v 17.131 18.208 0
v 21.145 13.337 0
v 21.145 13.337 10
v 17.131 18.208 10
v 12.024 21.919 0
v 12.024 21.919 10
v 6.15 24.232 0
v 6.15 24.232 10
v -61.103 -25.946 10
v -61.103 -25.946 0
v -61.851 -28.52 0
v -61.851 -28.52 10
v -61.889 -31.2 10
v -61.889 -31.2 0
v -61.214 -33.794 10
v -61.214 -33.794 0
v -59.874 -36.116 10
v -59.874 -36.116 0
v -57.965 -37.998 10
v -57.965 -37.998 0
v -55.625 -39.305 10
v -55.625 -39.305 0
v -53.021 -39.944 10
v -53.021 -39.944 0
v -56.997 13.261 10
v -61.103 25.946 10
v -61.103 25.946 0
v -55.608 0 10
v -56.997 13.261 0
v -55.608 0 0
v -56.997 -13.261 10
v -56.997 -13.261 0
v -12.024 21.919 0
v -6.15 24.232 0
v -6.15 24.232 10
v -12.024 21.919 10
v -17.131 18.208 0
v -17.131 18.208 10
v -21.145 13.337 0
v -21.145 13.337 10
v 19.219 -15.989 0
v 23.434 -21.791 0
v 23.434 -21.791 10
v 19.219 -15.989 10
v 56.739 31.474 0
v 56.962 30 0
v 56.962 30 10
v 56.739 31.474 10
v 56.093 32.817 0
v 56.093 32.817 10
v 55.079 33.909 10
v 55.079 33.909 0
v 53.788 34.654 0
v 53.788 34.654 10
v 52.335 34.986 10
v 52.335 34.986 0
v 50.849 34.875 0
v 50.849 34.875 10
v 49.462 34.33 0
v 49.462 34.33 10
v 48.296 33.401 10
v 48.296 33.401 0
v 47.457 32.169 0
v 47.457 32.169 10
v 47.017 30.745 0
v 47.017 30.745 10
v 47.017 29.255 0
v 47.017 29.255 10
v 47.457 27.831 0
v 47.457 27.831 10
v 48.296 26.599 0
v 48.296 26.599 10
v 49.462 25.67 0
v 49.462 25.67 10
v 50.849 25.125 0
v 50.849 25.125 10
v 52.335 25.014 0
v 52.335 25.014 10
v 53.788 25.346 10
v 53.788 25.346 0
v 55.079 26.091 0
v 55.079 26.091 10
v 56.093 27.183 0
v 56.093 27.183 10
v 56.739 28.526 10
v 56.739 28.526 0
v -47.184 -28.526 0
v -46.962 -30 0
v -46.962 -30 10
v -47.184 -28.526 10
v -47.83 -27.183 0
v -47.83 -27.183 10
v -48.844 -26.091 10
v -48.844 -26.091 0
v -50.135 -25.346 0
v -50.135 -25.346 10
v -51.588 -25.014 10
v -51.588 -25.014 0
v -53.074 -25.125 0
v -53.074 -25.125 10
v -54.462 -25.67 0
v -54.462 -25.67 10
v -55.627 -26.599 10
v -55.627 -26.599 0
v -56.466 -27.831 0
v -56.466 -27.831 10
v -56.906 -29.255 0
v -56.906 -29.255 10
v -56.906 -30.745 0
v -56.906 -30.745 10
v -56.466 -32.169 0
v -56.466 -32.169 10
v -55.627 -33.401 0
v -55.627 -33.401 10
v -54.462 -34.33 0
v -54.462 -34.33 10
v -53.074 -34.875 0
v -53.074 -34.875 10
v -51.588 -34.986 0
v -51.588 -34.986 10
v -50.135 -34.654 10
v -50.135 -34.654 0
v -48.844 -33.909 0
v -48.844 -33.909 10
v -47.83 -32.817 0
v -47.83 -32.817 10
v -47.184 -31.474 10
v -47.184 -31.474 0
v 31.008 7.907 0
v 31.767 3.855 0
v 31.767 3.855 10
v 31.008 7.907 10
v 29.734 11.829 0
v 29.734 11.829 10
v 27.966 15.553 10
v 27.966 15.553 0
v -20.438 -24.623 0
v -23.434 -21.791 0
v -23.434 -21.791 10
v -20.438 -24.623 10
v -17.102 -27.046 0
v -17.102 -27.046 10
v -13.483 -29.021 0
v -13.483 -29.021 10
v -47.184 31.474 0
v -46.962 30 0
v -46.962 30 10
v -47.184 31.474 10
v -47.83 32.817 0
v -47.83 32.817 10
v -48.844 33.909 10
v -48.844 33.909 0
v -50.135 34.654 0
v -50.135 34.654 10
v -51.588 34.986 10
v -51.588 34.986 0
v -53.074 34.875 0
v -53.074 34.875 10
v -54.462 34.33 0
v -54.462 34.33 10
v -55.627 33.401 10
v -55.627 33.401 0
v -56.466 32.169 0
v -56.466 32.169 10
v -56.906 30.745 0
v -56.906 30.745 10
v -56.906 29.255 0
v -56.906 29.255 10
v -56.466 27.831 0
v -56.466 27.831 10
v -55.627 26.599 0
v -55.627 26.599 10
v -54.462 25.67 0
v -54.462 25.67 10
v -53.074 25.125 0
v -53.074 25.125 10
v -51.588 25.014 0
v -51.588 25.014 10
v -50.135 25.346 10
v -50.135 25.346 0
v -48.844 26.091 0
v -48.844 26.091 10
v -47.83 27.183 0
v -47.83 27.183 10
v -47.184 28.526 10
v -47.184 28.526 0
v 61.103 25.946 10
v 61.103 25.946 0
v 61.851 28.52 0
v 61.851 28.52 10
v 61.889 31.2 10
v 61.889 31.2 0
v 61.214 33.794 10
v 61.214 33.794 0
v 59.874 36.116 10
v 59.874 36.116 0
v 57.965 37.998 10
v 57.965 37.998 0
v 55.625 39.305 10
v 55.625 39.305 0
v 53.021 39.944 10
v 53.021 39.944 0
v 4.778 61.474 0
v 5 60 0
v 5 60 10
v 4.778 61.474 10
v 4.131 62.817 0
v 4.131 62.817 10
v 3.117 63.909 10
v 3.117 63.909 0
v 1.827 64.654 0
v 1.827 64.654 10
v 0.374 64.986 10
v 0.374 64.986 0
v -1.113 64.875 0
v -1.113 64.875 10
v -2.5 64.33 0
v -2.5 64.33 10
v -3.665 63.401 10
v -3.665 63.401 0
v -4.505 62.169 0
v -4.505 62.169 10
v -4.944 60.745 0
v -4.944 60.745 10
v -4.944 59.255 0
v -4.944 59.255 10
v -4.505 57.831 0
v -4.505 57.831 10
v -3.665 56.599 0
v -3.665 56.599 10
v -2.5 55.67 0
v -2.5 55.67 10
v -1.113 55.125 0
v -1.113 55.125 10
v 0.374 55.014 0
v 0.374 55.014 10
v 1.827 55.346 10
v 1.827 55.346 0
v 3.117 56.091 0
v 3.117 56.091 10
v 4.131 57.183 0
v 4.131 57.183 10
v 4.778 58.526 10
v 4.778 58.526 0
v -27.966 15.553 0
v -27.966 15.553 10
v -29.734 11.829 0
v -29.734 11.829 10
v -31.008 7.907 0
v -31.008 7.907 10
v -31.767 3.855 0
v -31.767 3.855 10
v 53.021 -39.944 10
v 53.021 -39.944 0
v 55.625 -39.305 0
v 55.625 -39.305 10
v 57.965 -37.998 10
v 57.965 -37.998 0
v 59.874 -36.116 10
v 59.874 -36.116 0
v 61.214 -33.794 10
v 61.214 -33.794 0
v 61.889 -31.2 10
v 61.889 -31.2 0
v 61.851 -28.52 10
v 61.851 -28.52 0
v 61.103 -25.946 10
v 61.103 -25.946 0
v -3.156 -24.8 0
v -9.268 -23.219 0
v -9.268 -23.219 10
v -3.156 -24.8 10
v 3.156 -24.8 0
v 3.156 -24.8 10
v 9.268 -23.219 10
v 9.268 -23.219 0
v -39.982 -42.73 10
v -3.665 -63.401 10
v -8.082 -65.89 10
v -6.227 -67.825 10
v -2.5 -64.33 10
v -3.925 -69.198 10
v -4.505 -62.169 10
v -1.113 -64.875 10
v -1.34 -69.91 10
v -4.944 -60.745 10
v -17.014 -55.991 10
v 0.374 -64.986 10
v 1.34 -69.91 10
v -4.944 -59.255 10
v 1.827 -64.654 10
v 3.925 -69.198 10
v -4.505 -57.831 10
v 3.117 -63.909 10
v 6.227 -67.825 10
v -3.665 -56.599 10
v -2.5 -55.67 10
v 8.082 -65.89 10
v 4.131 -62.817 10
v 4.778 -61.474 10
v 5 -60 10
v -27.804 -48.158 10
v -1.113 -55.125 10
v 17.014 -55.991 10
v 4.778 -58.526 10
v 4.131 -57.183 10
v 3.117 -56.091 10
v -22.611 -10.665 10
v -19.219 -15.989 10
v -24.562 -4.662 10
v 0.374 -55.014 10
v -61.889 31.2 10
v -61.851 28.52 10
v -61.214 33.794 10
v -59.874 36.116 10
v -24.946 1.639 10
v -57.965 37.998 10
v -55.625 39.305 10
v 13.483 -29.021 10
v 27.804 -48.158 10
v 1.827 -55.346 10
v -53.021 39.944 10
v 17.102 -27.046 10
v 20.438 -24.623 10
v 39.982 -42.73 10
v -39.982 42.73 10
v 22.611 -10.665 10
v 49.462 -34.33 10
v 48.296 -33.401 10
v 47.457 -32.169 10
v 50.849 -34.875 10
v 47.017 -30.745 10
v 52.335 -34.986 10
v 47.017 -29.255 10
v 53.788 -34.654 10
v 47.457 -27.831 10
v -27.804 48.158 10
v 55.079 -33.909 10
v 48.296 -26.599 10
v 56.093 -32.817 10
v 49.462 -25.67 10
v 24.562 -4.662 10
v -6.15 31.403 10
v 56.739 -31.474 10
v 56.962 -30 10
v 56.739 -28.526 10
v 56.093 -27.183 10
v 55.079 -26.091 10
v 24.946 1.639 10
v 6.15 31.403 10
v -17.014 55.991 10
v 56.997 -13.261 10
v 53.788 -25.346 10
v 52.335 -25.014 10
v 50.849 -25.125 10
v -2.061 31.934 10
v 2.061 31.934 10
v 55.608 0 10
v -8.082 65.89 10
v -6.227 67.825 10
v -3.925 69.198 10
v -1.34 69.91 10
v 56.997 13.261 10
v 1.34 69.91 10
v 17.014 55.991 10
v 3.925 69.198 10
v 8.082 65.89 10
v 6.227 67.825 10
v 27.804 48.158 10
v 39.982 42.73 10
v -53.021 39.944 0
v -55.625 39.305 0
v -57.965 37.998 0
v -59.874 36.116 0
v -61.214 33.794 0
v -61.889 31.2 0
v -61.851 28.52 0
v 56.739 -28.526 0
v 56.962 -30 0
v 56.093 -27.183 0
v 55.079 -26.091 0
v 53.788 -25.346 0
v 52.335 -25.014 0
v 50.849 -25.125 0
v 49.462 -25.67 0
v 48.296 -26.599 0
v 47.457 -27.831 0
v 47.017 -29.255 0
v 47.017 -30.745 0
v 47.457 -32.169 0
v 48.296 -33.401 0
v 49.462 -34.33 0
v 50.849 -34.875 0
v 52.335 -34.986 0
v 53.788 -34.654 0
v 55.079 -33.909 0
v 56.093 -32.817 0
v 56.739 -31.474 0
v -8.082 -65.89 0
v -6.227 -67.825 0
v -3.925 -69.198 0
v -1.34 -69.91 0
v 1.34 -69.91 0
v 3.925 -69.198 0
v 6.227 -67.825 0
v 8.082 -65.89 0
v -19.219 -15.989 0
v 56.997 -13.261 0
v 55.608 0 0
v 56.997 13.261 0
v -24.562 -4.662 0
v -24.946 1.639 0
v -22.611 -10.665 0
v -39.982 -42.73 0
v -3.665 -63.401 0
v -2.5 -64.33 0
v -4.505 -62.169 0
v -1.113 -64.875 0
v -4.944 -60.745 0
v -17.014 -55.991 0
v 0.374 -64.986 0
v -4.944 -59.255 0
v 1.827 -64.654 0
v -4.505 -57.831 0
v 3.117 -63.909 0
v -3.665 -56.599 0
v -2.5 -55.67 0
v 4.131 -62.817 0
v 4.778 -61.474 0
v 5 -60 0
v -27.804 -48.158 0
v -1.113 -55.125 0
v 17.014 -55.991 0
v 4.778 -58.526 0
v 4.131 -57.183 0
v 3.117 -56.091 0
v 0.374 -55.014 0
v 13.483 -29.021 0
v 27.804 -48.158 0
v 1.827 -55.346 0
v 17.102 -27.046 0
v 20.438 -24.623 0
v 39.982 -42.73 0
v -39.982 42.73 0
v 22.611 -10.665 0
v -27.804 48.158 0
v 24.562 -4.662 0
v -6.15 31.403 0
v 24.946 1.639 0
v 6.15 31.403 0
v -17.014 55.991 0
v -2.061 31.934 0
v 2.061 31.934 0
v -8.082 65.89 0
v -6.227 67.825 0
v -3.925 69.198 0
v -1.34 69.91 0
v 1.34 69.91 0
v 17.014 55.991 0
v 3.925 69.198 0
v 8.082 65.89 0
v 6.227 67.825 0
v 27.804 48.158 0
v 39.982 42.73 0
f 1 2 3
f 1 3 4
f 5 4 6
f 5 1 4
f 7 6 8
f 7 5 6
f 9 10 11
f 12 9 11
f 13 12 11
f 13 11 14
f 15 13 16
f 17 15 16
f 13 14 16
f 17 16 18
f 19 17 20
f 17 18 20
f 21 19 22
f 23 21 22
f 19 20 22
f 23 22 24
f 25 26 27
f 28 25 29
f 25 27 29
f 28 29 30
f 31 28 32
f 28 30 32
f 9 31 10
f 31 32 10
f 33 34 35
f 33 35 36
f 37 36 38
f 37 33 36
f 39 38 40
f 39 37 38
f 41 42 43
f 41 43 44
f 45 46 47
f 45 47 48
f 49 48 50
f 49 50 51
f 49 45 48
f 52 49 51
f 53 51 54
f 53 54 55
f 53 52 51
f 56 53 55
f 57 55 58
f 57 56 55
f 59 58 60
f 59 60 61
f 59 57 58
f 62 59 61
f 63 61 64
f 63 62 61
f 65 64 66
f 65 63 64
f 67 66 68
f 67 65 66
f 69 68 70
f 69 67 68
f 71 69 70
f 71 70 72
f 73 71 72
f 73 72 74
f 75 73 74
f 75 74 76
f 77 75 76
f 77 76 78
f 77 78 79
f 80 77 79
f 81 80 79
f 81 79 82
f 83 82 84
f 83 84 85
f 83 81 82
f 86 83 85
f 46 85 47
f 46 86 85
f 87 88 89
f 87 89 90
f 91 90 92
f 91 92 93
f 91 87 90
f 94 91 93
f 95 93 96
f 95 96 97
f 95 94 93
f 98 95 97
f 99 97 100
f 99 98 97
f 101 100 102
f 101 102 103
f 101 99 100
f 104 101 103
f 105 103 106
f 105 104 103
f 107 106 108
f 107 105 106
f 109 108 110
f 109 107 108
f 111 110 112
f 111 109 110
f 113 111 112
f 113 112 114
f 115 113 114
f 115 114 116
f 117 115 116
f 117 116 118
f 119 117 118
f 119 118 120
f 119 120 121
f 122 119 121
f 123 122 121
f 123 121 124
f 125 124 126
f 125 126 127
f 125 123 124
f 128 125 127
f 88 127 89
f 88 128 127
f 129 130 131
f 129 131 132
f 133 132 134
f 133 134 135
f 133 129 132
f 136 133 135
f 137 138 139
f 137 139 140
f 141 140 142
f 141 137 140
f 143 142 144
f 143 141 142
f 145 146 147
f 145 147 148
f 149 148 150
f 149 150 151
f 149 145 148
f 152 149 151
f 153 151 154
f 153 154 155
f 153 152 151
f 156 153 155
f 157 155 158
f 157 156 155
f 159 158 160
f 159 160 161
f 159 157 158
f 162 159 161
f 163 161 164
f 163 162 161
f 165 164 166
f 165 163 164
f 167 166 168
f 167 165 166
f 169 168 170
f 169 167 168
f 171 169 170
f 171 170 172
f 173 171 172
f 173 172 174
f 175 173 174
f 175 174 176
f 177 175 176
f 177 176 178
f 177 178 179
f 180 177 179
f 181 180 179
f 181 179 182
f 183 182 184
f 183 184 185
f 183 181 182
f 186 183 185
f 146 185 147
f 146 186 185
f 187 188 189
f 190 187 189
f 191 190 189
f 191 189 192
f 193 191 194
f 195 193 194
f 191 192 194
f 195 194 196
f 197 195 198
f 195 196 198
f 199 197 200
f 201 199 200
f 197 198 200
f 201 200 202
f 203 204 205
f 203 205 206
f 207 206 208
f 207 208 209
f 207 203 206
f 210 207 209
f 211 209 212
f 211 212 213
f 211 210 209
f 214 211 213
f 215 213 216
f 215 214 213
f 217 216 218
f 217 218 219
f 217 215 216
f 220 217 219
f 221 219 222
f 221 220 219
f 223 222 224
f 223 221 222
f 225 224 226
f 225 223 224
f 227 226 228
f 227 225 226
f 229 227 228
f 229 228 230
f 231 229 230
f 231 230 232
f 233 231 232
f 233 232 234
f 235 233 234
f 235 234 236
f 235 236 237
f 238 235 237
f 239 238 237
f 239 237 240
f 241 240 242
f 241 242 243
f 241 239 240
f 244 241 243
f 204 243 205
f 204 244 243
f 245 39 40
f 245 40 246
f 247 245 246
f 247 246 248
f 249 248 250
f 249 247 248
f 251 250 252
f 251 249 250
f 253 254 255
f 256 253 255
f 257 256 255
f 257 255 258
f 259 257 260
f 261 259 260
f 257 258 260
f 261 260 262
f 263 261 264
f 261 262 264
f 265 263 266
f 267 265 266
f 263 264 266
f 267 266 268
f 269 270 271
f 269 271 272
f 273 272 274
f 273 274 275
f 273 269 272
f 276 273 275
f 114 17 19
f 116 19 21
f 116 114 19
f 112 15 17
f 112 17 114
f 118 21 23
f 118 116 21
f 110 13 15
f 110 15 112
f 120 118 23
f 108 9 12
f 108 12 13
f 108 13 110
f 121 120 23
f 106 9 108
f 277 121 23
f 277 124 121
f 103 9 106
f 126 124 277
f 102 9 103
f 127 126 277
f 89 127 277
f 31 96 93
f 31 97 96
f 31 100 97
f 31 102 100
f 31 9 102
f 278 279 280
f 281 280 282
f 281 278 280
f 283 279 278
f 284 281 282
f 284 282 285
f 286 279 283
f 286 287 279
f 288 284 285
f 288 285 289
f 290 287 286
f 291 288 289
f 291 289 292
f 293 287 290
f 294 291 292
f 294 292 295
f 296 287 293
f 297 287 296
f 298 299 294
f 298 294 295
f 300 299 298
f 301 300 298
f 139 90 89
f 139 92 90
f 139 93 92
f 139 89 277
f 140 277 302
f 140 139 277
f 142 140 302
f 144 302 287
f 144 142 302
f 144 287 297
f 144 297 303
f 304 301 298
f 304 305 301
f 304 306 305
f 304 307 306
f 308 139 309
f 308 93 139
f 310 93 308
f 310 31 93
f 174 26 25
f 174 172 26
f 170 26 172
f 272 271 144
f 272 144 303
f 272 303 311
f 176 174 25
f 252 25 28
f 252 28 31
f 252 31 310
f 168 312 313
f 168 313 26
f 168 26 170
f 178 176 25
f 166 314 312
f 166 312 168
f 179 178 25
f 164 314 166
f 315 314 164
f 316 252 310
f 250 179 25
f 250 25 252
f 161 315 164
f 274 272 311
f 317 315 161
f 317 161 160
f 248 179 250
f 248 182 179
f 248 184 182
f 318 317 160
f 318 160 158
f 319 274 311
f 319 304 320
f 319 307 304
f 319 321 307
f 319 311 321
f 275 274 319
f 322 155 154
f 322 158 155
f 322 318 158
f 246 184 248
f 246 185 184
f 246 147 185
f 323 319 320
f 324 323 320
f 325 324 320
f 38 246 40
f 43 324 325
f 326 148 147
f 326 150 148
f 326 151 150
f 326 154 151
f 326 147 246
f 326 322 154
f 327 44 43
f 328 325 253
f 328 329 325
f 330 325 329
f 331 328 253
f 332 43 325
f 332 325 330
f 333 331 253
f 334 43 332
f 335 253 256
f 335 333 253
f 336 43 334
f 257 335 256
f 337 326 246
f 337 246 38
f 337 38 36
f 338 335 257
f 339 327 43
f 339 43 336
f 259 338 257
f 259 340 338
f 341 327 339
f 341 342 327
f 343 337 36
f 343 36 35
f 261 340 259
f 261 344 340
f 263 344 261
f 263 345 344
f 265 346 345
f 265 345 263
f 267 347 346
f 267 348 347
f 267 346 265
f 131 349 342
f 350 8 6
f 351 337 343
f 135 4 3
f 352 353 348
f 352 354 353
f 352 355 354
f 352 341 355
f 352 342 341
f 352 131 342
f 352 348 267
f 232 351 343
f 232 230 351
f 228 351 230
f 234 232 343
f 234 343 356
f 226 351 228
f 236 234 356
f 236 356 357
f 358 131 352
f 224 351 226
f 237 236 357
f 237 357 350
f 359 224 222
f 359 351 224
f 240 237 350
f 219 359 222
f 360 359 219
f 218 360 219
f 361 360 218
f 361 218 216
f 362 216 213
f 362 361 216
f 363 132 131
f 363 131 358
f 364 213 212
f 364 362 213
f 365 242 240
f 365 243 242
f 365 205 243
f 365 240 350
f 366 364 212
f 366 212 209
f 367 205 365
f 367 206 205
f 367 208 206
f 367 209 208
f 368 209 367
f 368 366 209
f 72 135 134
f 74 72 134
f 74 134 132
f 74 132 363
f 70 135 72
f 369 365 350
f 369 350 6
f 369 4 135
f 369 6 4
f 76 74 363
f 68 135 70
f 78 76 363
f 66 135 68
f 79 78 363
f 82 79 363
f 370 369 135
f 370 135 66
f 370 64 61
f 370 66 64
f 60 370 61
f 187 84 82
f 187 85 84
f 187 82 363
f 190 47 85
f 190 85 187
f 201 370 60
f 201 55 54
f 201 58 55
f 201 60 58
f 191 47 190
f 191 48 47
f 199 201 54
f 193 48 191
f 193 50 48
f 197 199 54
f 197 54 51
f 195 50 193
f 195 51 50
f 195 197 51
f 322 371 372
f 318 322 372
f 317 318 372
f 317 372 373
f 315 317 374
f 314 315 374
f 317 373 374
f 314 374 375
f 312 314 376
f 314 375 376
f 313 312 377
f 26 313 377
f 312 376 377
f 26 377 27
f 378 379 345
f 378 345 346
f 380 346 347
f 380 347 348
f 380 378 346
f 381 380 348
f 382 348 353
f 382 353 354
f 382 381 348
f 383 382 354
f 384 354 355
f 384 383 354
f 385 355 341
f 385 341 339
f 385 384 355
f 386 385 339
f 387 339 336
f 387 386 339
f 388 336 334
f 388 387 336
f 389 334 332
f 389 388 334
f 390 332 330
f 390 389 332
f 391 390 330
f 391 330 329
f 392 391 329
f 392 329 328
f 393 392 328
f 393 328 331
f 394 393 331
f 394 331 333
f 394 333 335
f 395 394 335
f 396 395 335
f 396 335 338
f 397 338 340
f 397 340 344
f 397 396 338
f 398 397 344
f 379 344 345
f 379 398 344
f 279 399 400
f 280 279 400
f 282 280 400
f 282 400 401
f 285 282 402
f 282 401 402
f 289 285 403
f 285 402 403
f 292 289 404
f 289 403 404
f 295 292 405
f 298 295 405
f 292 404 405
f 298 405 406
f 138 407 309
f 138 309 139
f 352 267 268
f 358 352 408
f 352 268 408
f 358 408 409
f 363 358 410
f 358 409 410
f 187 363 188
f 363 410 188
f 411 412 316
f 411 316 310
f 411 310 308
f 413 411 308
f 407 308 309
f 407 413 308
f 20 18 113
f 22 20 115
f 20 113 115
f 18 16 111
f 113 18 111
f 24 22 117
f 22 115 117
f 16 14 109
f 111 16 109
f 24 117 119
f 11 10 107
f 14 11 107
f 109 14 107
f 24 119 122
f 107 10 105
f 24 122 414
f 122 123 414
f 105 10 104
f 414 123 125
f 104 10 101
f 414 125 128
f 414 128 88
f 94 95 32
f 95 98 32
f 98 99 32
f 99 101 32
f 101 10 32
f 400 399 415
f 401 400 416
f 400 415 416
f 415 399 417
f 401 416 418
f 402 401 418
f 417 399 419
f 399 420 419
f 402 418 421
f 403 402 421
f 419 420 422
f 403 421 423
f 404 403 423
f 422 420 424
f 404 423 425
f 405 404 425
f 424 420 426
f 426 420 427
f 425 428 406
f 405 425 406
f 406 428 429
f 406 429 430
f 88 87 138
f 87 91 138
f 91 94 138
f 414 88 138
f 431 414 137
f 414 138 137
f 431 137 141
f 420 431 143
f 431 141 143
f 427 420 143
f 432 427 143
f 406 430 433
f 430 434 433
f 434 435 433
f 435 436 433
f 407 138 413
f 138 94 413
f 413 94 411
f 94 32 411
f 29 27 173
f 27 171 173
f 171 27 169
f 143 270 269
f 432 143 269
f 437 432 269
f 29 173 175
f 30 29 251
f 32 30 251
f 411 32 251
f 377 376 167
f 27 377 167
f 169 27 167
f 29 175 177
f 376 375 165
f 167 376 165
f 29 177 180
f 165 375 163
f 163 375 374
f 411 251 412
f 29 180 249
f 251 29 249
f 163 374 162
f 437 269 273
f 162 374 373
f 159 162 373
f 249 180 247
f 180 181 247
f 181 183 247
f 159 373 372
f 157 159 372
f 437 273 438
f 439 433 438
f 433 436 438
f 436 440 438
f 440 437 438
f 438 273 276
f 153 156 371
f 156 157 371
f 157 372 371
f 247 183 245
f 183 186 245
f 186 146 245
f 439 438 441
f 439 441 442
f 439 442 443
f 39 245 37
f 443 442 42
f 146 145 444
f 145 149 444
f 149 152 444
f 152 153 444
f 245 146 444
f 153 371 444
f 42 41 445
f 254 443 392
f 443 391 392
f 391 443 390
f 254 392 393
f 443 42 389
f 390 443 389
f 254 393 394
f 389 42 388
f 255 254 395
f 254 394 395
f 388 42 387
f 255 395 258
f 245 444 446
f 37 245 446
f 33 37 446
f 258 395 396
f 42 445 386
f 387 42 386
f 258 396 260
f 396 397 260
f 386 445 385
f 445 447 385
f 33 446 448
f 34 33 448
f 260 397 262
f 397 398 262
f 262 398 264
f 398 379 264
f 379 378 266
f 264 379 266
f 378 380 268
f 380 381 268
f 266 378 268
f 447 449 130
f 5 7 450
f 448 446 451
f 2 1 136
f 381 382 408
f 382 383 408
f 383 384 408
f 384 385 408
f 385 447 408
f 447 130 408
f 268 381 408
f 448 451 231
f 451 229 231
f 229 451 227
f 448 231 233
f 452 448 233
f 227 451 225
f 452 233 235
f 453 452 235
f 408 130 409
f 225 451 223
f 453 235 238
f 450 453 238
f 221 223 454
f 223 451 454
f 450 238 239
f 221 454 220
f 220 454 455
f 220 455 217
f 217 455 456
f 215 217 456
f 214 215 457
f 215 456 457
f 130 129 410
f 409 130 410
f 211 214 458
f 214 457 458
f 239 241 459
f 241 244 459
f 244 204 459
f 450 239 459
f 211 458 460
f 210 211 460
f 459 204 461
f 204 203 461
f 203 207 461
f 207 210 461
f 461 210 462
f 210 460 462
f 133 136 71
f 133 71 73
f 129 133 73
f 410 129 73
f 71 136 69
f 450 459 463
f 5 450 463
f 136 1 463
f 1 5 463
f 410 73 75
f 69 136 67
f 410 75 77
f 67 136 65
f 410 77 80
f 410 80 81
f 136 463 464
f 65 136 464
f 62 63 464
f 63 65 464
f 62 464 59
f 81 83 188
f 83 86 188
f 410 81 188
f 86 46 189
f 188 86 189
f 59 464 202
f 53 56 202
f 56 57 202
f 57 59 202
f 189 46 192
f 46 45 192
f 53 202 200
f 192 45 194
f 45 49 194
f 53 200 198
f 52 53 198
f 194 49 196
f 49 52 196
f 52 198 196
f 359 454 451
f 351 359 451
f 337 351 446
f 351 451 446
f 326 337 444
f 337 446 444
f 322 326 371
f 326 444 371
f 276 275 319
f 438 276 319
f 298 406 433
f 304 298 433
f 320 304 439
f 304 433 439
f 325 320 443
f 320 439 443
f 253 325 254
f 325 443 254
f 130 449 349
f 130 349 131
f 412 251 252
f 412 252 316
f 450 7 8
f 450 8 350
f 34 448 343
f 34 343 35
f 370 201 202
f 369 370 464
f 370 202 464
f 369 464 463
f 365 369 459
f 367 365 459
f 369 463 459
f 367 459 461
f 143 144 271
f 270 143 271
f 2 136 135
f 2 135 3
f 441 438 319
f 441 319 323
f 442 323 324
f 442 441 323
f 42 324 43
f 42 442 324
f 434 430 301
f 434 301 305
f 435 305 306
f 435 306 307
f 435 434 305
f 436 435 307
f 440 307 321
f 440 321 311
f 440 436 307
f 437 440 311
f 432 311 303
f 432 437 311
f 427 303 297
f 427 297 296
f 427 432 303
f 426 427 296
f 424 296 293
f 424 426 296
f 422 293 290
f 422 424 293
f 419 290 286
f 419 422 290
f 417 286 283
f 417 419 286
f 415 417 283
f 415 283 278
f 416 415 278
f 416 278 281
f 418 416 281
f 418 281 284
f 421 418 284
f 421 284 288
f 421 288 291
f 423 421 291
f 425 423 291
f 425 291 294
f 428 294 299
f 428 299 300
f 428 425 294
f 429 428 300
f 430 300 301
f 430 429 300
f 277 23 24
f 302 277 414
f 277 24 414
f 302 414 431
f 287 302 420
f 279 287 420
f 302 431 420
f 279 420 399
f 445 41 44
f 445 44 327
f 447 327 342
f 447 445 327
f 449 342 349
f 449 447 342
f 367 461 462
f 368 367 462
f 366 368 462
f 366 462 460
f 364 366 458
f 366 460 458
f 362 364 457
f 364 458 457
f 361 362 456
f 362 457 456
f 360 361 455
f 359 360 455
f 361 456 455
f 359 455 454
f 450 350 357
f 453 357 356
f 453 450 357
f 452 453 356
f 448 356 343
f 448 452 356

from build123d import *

# Parameters (mm, degrees)
CROQUIS1_R              = 5
SALIENTE_EXTRUIR1_DEPTH = 10


with BuildPart() as part:
    # Croquis1 → Saliente-Extruir1 (new body)
    with BuildSketch(Plane.XY):
        with BuildLine():
            ThreePointArc((8.081598806, 65.88963163), (0, 70), (-8.081598806, 65.88963163))
            ThreePointArc((-8.081598806, 65.88963163), (-27.803831164, 48.157648221), (-53.021295435, 39.943685684))
            ThreePointArc((-53.021295435, 39.943685684), (-60.621778265, 35), (-61.102894241, 25.945945946))
            ThreePointArc((-61.102894241, 25.945945946), (-55.607662328, 0), (-61.102894241, -25.945945946))
            ThreePointArc((-61.102894241, -25.945945946), (-60.621778265, -35), (-53.021295435, -39.943685684))
            ThreePointArc((-53.021295435, -39.943685684), (-27.803831164, -48.157648221), (-8.081598806, -65.88963163))
            ThreePointArc((-8.081598806, -65.88963163), (0, -70), (8.081598806, -65.88963163))
            ThreePointArc((8.081598806, -65.88963163), (27.803831164, -48.157648221), (53.021295435, -39.943685684))
            ThreePointArc((53.021295435, -39.943685684), (60.621778265, -35), (61.102894241, -25.945945946))
            ThreePointArc((61.102894241, -25.945945946), (55.607662328, 0), (61.102894241, 25.945945946))
            ThreePointArc((61.102894241, 25.945945946), (60.621778265, 35), (53.021295435, 39.943685684))
            ThreePointArc((53.021295435, 39.943685684), (27.803831164, 48.157648221), (8.081598806, 65.88963163))
        make_face()
        with Locations((0, 60)):
            Circle(CROQUIS1_R, mode=Mode.SUBTRACT)
        with Locations((51.961524227, 30)):
            Circle(CROQUIS1_R, mode=Mode.SUBTRACT)
        with Locations((51.961524227, -30)):
            Circle(CROQUIS1_R, mode=Mode.SUBTRACT)
        with Locations((0, -60)):
            Circle(CROQUIS1_R, mode=Mode.SUBTRACT)
        with Locations((-51.961524227, -30)):
            Circle(CROQUIS1_R, mode=Mode.SUBTRACT)
        with Locations((-51.961524227, 30)):
            Circle(CROQUIS1_R, mode=Mode.SUBTRACT)
        with BuildLine():
            Line((27.966013781, 15.553201382), (21.14530514, 13.337018802))
            ThreePointArc((21.14530514, 13.337018802), (14.694631307, 20.225424859), (6.15, 24.231745707))
            Line((6.15, 24.231745707), (6.15, 31.403463185))
            ThreePointArc((6.15, 31.403463185), (0, 32), (-6.15, 31.403463185))
            Line((-6.15, 31.403463185), (-6.15, 24.231745707))
            ThreePointArc((-6.15, 24.231745707), (-14.694631307, 20.225424859), (-21.14530514, 13.337018802))
            Line((-21.14530514, 13.337018802), (-27.966013781, 15.553201382))
            ThreePointArc((-27.966013781, 15.553201382), (-30.433808521, 9.88854382), (-31.766922812, 3.855206231))
            Line((-31.766922812, 3.855206231), (-24.946214171, 1.639023652))
            ThreePointArc((-24.946214171, 1.639023652), (-23.776412907, -7.725424859), (-19.218517279, -15.989014779))
            Line((-19.218517279, -15.989014779), (-23.433947046, -21.791056097))
            ThreePointArc((-23.433947046, -21.791056097), (-18.809128073, -25.88854382), (-13.483038016, -29.0208147))
            Line((-13.483038016, -29.0208147), (-9.267608248, -23.218773382))
            ThreePointArc((-9.267608248, -23.218773382), (0, -25), (9.267608248, -23.218773382))
            Line((9.267608248, -23.218773382), (13.483038016, -29.0208147))
            ThreePointArc((13.483038016, -29.0208147), (18.809128073, -25.88854382), (23.433947046, -21.791056097))
            Line((23.433947046, -21.791056097), (19.218517279, -15.989014779))
            ThreePointArc((19.218517279, -15.989014779), (23.776412907, -7.725424859), (24.946214171, 1.639023652))
            Line((24.946214171, 1.639023652), (31.766922812, 3.855206231))
            ThreePointArc((31.766922812, 3.855206231), (30.433808521, 9.88854382), (27.966013781, 15.553201382))
        make_face(mode=Mode.SUBTRACT)
    extrude(amount=SALIENTE_EXTRUIR1_DEPTH)


solid = part.part
